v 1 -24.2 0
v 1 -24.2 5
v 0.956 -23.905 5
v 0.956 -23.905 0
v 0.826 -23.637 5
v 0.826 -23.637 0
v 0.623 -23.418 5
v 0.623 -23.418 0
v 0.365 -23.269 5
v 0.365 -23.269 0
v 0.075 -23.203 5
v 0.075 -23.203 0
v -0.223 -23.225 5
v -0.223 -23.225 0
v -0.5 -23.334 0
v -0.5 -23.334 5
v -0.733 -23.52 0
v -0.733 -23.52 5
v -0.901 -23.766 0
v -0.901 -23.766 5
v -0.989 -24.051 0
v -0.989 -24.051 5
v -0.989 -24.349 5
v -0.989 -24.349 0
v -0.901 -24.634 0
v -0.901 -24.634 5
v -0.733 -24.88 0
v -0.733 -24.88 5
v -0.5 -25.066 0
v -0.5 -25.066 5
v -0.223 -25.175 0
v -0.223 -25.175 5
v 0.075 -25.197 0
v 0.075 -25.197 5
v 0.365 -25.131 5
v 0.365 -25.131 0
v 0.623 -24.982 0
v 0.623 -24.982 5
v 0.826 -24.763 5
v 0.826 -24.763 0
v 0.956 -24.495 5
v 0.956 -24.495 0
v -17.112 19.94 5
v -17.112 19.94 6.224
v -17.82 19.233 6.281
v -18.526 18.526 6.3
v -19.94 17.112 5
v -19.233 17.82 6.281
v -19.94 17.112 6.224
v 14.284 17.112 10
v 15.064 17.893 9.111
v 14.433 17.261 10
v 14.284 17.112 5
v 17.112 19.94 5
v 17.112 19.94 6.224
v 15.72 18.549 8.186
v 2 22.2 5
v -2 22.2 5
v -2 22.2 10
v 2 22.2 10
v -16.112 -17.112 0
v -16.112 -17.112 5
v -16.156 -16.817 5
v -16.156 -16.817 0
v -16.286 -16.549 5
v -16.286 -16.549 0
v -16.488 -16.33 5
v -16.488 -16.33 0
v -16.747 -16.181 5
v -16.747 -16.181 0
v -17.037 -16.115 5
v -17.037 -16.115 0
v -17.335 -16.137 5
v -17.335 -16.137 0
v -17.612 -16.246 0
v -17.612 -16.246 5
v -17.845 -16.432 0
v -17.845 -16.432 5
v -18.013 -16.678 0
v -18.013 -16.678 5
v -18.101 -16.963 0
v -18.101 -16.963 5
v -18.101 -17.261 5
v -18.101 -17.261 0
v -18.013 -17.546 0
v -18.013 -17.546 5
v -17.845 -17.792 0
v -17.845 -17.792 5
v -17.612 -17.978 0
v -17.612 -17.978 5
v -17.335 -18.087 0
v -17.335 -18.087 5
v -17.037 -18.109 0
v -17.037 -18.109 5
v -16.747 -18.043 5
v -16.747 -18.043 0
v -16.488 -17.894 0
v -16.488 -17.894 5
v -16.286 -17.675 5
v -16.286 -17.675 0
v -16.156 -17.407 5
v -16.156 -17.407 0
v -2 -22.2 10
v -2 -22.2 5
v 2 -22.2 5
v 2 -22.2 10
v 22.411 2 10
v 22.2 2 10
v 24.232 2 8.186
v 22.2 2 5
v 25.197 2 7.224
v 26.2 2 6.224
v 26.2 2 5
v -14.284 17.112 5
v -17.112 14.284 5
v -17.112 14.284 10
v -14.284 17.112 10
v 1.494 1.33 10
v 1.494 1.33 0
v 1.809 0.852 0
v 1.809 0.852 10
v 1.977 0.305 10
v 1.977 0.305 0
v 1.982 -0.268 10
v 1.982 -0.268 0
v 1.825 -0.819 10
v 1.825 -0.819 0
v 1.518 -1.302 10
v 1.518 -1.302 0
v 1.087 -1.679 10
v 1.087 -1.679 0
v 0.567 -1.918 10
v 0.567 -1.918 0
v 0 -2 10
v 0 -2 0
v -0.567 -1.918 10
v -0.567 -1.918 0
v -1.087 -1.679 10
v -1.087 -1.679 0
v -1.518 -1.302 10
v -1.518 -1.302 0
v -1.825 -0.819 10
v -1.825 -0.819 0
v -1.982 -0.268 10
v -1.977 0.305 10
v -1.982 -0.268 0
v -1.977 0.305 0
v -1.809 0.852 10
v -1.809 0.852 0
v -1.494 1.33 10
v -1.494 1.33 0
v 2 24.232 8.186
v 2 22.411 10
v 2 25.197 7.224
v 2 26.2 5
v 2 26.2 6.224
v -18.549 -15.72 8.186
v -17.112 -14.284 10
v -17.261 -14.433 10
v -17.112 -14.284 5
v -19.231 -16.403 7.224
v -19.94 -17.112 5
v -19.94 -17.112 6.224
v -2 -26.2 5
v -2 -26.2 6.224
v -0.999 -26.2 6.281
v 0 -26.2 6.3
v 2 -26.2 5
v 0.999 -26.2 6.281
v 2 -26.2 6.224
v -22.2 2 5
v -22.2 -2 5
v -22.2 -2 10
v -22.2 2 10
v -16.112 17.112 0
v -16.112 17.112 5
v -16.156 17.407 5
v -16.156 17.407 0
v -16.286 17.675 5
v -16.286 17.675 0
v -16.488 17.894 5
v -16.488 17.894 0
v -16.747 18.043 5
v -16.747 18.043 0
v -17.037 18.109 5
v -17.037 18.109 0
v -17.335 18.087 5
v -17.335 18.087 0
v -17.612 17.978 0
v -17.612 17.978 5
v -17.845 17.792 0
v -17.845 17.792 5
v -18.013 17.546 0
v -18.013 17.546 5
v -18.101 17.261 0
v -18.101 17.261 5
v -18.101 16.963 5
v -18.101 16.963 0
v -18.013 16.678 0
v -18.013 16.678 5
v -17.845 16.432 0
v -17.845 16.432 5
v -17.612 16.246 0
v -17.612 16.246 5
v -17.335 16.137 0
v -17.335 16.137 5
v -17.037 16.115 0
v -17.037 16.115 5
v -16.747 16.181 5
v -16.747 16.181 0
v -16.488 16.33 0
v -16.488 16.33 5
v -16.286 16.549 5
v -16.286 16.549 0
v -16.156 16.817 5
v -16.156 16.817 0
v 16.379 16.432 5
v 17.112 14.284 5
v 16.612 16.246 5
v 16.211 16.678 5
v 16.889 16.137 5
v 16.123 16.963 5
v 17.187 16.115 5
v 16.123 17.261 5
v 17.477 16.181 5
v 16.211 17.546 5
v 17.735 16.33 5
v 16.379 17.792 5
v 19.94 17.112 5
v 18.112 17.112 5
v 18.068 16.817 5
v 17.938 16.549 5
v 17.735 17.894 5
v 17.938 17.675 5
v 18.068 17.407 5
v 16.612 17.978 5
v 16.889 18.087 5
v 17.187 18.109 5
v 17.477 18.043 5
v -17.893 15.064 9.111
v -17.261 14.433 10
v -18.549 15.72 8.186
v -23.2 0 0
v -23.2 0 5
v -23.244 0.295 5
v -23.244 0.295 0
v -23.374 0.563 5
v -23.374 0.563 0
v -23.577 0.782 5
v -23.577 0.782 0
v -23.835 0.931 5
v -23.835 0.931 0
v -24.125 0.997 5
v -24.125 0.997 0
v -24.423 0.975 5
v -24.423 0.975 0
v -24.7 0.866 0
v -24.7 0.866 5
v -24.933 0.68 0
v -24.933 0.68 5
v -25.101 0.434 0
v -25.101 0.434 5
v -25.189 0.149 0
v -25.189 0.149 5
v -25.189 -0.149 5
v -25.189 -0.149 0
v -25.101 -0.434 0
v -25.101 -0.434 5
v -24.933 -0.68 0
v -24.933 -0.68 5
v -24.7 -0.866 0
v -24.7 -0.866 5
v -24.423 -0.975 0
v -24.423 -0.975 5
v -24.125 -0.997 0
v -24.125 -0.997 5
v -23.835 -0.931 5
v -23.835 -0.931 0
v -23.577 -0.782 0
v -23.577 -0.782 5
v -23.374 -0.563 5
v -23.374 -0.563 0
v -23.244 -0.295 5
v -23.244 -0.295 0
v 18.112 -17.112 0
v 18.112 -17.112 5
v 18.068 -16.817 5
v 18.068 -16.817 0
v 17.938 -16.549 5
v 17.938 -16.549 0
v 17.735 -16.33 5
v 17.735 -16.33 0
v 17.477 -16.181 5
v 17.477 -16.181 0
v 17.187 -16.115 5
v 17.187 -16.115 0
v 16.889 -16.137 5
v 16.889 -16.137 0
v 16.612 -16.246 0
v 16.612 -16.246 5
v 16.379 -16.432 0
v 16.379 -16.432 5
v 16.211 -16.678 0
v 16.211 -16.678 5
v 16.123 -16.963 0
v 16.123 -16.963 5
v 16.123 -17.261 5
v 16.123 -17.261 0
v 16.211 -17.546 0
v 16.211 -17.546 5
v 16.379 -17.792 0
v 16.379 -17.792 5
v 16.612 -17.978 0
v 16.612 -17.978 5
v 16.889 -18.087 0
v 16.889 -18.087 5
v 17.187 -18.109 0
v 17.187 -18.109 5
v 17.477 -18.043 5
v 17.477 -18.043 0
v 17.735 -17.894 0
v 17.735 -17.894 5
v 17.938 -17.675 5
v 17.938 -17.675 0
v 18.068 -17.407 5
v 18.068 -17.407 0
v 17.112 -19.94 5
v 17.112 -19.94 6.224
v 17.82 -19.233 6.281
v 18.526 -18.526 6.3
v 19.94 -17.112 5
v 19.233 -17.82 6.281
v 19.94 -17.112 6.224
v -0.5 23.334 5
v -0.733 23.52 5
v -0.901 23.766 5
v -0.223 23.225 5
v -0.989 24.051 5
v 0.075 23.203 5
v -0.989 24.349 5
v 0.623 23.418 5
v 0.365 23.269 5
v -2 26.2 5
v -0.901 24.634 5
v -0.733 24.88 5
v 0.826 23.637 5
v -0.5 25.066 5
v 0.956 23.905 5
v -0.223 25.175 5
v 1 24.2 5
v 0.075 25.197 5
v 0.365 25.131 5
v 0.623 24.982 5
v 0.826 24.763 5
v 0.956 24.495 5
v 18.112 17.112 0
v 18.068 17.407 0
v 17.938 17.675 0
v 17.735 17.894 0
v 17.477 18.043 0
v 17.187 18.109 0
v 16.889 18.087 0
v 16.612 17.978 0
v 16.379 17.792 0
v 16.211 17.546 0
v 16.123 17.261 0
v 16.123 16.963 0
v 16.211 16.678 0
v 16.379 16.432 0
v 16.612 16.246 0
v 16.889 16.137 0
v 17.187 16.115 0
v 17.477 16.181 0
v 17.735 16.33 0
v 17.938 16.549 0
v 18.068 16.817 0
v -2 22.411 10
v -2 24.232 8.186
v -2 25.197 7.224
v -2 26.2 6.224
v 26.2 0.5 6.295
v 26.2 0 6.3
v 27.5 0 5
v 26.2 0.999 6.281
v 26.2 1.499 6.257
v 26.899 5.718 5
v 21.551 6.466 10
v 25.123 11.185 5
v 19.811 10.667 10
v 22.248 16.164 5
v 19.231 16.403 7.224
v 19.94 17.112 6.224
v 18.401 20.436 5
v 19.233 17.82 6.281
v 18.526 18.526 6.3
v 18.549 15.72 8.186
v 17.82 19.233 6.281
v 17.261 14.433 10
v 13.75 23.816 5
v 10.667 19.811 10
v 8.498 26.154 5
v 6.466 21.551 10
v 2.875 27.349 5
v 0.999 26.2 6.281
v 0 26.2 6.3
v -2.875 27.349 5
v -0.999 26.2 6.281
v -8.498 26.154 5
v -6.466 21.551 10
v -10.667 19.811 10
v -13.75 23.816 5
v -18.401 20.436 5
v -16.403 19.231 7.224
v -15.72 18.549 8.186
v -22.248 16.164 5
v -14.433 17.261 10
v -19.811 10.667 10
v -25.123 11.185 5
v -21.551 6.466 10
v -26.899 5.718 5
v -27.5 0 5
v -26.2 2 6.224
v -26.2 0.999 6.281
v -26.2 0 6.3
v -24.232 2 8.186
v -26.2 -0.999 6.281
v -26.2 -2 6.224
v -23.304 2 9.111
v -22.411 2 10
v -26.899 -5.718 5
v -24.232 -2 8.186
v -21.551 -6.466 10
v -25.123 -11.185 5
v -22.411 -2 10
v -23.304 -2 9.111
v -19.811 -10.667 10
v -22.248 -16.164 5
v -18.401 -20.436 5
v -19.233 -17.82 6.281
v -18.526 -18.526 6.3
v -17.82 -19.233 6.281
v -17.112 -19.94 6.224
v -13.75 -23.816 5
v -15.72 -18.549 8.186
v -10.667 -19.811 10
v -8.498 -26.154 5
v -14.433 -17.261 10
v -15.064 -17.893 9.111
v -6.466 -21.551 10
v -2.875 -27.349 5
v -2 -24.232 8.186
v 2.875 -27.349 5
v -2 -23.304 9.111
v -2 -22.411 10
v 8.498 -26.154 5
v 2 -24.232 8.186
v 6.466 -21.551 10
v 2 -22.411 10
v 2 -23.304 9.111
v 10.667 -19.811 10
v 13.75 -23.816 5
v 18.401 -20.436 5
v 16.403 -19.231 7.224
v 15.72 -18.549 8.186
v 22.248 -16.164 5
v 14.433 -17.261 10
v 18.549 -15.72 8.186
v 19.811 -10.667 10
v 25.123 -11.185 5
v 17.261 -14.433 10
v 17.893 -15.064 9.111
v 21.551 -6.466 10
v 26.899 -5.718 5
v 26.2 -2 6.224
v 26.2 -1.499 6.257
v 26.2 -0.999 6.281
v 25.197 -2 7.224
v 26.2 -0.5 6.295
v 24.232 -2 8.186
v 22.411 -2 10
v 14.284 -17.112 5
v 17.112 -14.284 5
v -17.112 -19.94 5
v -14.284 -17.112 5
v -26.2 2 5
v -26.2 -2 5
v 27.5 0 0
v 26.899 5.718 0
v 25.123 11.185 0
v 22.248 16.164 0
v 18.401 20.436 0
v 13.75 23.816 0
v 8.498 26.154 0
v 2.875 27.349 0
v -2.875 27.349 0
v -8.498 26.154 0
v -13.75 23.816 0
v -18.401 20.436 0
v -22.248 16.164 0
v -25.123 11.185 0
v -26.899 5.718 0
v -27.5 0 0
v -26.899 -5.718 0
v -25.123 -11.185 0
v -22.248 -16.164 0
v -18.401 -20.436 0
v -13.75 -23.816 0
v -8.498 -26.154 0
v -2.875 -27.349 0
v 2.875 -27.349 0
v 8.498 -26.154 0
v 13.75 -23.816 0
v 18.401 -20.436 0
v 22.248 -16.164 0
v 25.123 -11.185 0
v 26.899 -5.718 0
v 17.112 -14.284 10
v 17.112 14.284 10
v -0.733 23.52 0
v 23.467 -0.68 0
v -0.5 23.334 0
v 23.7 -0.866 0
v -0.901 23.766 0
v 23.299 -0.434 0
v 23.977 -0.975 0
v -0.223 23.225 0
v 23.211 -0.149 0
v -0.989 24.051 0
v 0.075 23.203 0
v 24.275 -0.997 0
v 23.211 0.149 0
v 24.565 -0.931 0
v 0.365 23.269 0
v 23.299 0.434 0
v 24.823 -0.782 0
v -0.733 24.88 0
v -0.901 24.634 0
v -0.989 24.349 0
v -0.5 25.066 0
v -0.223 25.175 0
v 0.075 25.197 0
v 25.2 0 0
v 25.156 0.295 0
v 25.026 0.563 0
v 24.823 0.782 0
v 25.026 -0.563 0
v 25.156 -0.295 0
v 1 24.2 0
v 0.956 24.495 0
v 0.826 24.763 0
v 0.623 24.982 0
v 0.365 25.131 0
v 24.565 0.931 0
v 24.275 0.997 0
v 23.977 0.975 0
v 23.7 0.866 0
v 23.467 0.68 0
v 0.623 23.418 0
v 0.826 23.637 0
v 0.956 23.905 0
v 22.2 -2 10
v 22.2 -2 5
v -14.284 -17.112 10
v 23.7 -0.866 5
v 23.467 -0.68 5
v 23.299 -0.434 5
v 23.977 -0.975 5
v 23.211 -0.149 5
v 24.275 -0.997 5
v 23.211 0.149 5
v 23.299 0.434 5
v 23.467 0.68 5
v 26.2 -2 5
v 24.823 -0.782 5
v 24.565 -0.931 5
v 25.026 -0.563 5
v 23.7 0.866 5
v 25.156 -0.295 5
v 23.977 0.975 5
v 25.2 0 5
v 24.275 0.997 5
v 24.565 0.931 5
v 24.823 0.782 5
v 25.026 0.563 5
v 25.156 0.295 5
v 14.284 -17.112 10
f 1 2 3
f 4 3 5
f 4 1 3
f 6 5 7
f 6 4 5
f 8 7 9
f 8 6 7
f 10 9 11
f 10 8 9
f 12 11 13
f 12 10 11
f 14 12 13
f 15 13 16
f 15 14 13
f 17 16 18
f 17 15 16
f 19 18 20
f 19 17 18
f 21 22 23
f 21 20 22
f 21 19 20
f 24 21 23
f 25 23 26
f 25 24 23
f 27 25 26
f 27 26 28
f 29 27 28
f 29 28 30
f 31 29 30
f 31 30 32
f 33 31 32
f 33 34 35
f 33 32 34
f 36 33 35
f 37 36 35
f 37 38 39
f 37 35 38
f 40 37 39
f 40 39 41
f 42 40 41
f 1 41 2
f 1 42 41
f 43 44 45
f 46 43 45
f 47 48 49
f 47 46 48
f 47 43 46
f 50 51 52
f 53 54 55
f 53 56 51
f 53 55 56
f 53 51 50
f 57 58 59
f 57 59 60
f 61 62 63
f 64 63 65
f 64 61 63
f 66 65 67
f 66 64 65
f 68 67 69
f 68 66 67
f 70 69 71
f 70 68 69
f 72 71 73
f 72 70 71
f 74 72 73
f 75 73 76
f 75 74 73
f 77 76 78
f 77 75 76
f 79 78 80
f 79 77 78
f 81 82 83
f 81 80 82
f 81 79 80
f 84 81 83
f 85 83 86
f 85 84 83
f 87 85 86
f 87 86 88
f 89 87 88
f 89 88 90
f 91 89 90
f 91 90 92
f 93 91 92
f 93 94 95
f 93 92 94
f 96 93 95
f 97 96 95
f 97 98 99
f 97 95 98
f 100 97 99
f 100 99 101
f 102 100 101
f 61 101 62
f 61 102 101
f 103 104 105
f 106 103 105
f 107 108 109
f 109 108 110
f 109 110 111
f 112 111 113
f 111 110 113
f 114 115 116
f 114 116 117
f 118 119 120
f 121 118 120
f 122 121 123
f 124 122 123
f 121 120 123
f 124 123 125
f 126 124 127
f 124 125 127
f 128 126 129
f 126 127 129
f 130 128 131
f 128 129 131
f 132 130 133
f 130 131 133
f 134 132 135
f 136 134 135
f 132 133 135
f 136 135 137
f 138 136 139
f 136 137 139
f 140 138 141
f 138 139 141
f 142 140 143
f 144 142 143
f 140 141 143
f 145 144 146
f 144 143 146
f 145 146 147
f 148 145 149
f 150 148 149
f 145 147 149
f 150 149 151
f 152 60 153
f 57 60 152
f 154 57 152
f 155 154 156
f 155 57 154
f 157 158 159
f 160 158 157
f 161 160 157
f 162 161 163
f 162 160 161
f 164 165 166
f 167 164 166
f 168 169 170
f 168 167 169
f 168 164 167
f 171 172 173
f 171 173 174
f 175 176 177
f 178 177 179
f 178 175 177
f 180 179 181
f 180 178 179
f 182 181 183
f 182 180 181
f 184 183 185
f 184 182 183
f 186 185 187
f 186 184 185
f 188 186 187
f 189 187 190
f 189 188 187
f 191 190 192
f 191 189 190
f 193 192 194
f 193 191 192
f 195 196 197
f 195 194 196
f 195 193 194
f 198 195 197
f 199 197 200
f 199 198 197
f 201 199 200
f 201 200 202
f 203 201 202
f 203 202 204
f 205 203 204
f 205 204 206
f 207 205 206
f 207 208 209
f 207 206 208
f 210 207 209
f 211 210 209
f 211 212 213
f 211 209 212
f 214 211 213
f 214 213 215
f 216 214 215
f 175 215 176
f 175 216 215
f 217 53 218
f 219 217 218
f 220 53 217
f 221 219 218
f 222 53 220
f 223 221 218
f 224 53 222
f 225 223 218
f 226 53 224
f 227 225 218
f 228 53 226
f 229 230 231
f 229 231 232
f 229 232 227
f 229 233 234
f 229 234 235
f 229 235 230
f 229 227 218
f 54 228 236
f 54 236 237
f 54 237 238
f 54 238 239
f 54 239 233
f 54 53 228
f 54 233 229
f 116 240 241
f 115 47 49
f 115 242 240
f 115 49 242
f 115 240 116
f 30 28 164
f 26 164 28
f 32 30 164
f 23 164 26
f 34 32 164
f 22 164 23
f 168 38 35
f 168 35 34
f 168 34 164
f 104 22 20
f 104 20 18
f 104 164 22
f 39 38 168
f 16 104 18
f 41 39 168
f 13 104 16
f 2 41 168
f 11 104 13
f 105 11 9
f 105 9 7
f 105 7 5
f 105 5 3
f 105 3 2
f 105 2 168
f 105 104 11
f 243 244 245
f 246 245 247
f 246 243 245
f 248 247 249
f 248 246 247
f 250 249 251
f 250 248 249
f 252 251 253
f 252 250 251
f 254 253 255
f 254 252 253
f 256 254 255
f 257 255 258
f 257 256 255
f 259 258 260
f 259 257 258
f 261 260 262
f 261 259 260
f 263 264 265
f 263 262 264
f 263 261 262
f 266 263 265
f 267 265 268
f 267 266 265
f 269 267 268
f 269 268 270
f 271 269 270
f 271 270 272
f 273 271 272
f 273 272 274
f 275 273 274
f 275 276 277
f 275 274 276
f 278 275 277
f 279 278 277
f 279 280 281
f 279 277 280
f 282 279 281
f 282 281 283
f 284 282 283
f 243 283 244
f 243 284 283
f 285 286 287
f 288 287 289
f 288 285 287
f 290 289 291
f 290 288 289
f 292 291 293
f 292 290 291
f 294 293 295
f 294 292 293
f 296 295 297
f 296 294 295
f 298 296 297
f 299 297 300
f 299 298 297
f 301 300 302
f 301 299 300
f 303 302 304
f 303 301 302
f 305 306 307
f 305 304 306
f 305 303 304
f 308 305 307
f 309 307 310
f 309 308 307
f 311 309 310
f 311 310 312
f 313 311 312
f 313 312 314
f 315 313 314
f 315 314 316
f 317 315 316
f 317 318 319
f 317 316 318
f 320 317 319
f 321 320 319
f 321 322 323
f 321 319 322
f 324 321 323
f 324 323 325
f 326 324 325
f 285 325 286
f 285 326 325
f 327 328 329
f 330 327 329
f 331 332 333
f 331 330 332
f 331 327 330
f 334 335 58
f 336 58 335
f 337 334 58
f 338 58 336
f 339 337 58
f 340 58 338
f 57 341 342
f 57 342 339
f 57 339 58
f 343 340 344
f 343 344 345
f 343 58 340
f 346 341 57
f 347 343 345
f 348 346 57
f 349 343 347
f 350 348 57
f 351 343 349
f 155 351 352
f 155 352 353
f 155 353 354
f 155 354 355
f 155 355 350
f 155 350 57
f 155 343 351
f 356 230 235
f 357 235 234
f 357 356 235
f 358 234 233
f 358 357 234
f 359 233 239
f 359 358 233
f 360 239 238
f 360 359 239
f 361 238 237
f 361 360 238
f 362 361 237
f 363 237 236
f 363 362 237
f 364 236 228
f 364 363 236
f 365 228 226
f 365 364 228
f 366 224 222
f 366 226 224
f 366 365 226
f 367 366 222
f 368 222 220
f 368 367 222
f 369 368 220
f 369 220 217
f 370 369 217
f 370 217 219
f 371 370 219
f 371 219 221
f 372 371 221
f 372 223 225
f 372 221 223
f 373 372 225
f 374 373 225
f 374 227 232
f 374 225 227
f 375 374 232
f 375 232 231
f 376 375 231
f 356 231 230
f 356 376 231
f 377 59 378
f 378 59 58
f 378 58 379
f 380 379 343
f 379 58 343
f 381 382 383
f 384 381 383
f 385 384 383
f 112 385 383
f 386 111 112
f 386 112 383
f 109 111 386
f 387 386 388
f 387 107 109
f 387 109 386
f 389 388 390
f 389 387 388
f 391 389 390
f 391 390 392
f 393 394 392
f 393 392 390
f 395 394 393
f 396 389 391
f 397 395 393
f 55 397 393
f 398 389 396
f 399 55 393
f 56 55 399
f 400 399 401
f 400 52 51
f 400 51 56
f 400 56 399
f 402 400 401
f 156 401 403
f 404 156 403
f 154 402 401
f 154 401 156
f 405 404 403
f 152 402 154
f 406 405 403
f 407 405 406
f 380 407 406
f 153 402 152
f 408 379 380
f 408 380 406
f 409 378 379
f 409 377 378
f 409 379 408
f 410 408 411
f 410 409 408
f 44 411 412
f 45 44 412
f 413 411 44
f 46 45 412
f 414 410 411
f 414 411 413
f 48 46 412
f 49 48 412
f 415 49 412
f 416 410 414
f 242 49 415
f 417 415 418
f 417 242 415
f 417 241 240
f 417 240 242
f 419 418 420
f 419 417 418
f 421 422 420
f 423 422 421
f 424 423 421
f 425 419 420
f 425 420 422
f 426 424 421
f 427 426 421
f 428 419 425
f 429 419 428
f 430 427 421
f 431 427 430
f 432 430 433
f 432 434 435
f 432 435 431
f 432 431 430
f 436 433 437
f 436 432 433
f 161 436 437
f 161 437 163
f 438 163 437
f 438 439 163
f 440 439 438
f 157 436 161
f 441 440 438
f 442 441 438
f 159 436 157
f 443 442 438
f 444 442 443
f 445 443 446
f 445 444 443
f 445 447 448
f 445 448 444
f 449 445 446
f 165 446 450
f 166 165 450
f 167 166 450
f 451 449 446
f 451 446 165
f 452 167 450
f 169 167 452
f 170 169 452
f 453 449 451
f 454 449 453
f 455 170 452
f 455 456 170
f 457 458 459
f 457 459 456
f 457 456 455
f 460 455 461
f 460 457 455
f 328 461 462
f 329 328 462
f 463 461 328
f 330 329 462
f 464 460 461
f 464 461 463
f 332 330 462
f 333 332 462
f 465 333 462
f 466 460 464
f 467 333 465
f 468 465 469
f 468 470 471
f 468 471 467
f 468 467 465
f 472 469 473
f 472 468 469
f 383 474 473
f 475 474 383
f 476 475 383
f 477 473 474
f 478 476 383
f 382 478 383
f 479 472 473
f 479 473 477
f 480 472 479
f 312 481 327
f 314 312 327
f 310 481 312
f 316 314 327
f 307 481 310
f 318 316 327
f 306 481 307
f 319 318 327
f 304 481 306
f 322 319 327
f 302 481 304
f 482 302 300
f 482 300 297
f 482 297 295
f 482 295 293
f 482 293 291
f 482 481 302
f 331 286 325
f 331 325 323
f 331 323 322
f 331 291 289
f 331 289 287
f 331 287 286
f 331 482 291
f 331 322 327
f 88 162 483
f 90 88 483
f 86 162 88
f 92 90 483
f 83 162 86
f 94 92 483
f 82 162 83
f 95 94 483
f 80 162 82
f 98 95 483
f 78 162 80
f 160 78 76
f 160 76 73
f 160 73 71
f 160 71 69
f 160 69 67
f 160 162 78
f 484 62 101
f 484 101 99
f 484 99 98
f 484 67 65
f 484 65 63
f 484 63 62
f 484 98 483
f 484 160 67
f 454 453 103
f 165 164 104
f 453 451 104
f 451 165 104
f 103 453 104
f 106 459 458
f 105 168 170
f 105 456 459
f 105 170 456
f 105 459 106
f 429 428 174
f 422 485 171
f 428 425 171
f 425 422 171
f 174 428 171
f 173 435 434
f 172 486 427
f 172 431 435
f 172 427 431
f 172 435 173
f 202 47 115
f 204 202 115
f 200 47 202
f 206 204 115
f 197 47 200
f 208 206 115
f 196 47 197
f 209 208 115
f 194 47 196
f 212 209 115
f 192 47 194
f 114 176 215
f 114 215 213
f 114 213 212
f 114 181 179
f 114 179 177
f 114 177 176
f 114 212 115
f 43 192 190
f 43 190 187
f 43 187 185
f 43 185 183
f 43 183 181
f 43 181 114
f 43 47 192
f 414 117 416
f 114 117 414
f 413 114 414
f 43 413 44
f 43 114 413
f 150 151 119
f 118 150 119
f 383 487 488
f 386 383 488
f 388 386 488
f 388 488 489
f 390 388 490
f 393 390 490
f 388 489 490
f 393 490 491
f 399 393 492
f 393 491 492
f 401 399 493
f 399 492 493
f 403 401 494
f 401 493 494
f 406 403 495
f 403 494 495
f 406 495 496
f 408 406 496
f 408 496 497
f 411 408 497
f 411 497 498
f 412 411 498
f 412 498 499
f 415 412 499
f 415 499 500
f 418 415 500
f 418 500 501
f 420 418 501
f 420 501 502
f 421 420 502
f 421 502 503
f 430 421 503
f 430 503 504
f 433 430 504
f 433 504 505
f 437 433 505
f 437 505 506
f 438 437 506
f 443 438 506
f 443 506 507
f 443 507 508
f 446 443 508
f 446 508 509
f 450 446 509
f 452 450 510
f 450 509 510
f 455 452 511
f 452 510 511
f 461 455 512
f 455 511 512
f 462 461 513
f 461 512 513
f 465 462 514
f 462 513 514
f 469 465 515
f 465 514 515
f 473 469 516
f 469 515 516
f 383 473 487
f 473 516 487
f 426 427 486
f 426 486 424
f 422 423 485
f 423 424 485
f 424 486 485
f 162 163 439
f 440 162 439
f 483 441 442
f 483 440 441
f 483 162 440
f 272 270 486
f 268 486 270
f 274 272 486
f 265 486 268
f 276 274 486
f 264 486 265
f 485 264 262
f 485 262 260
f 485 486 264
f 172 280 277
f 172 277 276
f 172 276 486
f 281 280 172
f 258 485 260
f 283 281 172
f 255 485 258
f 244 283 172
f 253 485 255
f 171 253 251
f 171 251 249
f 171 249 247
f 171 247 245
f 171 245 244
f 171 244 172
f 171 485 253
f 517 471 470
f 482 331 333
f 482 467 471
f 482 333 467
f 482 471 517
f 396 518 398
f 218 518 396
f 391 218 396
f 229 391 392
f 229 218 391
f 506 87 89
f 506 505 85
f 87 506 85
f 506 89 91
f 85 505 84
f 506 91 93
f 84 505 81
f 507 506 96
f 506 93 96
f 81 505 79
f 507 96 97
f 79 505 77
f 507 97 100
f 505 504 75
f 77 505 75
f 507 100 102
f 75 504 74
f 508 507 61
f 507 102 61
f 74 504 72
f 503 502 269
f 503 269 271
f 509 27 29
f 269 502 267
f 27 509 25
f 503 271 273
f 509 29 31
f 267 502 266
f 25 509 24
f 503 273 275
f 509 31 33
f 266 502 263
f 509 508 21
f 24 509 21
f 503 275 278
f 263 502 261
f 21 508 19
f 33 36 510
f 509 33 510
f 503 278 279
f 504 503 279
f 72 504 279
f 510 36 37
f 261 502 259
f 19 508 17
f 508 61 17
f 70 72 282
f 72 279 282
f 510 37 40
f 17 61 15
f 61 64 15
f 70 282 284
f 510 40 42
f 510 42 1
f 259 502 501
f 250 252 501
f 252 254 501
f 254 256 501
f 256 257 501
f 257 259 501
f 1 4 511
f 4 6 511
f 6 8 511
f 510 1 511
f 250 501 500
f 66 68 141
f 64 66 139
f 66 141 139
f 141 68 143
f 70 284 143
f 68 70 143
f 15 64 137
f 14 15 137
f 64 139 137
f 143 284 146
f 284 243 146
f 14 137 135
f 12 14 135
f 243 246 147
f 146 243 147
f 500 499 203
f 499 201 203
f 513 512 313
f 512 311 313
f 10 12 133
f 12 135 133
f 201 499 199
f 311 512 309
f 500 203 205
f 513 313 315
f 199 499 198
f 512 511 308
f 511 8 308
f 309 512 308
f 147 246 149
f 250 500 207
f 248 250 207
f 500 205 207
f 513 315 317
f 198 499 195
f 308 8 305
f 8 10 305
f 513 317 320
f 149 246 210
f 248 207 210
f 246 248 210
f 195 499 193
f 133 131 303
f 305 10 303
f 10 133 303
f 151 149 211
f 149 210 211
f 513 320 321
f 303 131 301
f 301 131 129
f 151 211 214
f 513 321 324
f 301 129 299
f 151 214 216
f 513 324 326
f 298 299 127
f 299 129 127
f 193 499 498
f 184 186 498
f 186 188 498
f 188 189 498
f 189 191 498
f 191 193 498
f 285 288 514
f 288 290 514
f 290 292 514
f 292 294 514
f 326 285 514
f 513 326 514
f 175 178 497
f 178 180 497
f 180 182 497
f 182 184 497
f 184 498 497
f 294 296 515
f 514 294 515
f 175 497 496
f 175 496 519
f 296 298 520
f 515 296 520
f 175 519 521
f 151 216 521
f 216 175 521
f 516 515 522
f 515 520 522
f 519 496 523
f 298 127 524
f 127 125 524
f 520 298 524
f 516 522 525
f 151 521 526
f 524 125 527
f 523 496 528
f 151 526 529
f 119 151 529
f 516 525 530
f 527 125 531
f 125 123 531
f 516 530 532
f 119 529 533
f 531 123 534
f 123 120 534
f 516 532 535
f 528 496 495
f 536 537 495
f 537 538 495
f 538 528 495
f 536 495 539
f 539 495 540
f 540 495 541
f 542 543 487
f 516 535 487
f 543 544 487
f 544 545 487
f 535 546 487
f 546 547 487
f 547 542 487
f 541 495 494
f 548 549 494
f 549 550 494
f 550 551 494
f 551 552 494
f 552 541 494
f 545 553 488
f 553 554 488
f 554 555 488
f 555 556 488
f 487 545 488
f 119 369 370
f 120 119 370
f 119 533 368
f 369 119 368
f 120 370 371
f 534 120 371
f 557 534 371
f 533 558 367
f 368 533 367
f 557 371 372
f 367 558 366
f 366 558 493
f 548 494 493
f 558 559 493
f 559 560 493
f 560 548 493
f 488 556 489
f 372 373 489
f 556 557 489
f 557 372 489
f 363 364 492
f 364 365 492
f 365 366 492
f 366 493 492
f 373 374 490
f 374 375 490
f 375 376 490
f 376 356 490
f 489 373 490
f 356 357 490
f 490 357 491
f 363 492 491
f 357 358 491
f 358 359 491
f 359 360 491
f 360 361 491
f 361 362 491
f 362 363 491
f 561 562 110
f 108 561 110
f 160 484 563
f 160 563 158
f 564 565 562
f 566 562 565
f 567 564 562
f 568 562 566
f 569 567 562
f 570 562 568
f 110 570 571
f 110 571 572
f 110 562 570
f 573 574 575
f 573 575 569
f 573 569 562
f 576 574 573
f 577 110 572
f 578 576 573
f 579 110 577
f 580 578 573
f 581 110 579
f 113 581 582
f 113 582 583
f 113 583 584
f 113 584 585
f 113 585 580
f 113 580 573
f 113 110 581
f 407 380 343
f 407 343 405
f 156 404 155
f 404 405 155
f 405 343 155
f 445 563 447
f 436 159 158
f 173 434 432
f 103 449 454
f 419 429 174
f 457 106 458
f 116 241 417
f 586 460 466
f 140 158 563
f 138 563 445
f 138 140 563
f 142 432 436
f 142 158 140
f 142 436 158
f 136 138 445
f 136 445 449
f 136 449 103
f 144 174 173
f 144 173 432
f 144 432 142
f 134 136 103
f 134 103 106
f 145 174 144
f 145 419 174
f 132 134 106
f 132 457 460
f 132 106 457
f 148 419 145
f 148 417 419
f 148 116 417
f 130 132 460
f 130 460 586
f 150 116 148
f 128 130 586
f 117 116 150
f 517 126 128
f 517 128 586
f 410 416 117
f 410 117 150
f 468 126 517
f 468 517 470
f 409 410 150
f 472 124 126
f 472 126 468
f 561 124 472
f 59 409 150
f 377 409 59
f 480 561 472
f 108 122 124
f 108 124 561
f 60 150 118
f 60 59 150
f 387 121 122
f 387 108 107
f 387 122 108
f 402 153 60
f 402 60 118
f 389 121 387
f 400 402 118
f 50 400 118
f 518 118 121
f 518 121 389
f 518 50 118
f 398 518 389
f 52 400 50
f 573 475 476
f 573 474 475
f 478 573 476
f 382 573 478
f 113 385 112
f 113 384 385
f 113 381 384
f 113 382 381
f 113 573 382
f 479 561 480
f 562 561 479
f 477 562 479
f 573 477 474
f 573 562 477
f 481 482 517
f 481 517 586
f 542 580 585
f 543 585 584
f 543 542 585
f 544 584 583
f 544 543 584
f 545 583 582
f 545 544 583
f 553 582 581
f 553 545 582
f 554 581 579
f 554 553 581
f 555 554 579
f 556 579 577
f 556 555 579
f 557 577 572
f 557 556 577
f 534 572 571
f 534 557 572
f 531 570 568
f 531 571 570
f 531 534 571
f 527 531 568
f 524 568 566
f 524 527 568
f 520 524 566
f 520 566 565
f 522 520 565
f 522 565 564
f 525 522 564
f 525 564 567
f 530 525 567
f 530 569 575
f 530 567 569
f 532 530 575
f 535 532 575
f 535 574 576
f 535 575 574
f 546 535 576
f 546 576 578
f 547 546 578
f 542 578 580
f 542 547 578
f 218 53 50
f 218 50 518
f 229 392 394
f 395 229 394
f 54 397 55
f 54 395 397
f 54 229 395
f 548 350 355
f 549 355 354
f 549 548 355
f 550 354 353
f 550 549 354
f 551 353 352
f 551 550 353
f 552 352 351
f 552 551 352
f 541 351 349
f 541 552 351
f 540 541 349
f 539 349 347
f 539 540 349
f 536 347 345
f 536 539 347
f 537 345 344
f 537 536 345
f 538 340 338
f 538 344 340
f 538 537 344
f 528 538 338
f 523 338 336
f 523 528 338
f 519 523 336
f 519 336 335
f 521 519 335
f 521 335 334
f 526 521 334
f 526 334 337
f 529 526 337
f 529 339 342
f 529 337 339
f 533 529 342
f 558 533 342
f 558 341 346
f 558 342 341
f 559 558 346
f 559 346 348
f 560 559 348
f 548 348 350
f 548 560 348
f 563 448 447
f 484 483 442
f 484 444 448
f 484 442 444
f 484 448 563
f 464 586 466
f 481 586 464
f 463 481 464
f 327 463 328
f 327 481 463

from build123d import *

# Parameters (mm, degrees)
F0_R     = 27.5
F0_R_2   = 1
F0_R_3   = 21.1
F1_DEPTH = 10
F3_DEPTH = 10
F5_W     = 4
F5_H     = 4
F5_R     = 1
F6_DEPTH = 5


# Not quite as in the source:
# - a fillet or chamfer that OpenCascade refuses, or shapes differently, is made with other operations: its cross-section is extruded or revolved along the edge and cut away or added


with BuildPart() as f1:
    # F0 (on Top) → F1 (new body)
    with BuildSketch(Plane.XY):
        Circle(F0_R)
        with Locations((-17.1119841047, -17.1119841047)):
            Circle(F0_R_2, mode=Mode.SUBTRACT)
        with Locations((0, -24.2)):
            Circle(F0_R_2, mode=Mode.SUBTRACT)
        with Locations((17.1119841047, -17.1119841047)):
            Circle(F0_R_2, mode=Mode.SUBTRACT)
        with Locations((-24.2, 0)):
            Circle(F0_R_2, mode=Mode.SUBTRACT)
        with Locations((-17.1119841047, 17.1119841047)):
            Circle(F0_R_2, mode=Mode.SUBTRACT)
        Circle(F0_R_3, mode=Mode.SUBTRACT)
        with Locations((24.2, 0)):
            Circle(F0_R_2, mode=Mode.SUBTRACT)
        with Locations((0, 24.2)):
            Circle(F0_R_2, mode=Mode.SUBTRACT)
        with Locations((17.1119841047, 17.1119841047)):
            Circle(F0_R_2, mode=Mode.SUBTRACT)
        Circle(F0_R_3)
        with BuildLine():
            ThreePointArc((1.4936867141, 1.33), (0, -2), (-1.4936867141, 1.33))
            Line((-1.4936867141, 1.33), (1.4936867141, 1.33))
        make_face(mode=Mode.SUBTRACT)
    extrude(amount=F1_DEPTH)

    # F2: chamfer of 5 on 1 edges, made by hand

    # F2_s1 → F2_t2 (revolve, cut)
    with BuildSketch(Plane.XZ):
        Polygon((27.5, 5), (22.5, 10), (27.5, 10), align=None)
    revolve(axis=Axis((0, 0, 10), (0, 0, 1)), mode=Mode.SUBTRACT)

    # F0 (on Top) → F3 (cut)
    with BuildSketch(Plane.XY):
        with BuildLine():
            Line((1.4936867141, 1.33), (-1.4936867141, 1.33))
            ThreePointArc((-1.4936867141, 1.33), (0, -2), (1.4936867141, 1.33))
        make_face()
    extrude(amount=F3_DEPTH, mode=Mode.SUBTRACT)

    # F5 (on offset) → F6 (cut)
    with BuildSketch(Plane.XY.offset(5)):
        with Locations((0, 24.2)):
            Rectangle(F5_W, F5_H)
        with Locations((0, 24.2)):
            Circle(F5_R, mode=Mode.SUBTRACT)
        with Locations((0, 24.2)):
            Circle(F5_R)
        Polygon((-14.28355698, 17.1119841047), (-17.1119841047, 19.9404112295), (-19.9404112295, 17.1119841047), (-17.1119841047, 14.28355698), align=None)
        Polygon((17.1119841047, 14.28355698), (19.9404112295, 17.1119841047), (17.1119841047, 19.9404112295), (14.28355698, 17.1119841047), align=None)
        with Locations((-24.2, 0)):
            Rectangle(F5_W, F5_H)
        Polygon((-17.1119841047, -14.28355698), (-19.9404112295, -17.1119841047), (-17.1119841047, -19.9404112295), (-14.28355698, -17.1119841047), align=None)
        with Locations((0, -24.2)):
            Rectangle(F5_W, F5_H)
        Polygon((14.28355698, -17.1119841047), (17.1119841047, -19.9404112295), (19.9404112295, -17.1119841047), (17.1119841047, -14.28355698), align=None)
        with Locations((24.2, 0)):
            Rectangle(F5_W, F5_H)
    extrude(amount=F6_DEPTH, mode=Mode.SUBTRACT)


solid = f1.part
